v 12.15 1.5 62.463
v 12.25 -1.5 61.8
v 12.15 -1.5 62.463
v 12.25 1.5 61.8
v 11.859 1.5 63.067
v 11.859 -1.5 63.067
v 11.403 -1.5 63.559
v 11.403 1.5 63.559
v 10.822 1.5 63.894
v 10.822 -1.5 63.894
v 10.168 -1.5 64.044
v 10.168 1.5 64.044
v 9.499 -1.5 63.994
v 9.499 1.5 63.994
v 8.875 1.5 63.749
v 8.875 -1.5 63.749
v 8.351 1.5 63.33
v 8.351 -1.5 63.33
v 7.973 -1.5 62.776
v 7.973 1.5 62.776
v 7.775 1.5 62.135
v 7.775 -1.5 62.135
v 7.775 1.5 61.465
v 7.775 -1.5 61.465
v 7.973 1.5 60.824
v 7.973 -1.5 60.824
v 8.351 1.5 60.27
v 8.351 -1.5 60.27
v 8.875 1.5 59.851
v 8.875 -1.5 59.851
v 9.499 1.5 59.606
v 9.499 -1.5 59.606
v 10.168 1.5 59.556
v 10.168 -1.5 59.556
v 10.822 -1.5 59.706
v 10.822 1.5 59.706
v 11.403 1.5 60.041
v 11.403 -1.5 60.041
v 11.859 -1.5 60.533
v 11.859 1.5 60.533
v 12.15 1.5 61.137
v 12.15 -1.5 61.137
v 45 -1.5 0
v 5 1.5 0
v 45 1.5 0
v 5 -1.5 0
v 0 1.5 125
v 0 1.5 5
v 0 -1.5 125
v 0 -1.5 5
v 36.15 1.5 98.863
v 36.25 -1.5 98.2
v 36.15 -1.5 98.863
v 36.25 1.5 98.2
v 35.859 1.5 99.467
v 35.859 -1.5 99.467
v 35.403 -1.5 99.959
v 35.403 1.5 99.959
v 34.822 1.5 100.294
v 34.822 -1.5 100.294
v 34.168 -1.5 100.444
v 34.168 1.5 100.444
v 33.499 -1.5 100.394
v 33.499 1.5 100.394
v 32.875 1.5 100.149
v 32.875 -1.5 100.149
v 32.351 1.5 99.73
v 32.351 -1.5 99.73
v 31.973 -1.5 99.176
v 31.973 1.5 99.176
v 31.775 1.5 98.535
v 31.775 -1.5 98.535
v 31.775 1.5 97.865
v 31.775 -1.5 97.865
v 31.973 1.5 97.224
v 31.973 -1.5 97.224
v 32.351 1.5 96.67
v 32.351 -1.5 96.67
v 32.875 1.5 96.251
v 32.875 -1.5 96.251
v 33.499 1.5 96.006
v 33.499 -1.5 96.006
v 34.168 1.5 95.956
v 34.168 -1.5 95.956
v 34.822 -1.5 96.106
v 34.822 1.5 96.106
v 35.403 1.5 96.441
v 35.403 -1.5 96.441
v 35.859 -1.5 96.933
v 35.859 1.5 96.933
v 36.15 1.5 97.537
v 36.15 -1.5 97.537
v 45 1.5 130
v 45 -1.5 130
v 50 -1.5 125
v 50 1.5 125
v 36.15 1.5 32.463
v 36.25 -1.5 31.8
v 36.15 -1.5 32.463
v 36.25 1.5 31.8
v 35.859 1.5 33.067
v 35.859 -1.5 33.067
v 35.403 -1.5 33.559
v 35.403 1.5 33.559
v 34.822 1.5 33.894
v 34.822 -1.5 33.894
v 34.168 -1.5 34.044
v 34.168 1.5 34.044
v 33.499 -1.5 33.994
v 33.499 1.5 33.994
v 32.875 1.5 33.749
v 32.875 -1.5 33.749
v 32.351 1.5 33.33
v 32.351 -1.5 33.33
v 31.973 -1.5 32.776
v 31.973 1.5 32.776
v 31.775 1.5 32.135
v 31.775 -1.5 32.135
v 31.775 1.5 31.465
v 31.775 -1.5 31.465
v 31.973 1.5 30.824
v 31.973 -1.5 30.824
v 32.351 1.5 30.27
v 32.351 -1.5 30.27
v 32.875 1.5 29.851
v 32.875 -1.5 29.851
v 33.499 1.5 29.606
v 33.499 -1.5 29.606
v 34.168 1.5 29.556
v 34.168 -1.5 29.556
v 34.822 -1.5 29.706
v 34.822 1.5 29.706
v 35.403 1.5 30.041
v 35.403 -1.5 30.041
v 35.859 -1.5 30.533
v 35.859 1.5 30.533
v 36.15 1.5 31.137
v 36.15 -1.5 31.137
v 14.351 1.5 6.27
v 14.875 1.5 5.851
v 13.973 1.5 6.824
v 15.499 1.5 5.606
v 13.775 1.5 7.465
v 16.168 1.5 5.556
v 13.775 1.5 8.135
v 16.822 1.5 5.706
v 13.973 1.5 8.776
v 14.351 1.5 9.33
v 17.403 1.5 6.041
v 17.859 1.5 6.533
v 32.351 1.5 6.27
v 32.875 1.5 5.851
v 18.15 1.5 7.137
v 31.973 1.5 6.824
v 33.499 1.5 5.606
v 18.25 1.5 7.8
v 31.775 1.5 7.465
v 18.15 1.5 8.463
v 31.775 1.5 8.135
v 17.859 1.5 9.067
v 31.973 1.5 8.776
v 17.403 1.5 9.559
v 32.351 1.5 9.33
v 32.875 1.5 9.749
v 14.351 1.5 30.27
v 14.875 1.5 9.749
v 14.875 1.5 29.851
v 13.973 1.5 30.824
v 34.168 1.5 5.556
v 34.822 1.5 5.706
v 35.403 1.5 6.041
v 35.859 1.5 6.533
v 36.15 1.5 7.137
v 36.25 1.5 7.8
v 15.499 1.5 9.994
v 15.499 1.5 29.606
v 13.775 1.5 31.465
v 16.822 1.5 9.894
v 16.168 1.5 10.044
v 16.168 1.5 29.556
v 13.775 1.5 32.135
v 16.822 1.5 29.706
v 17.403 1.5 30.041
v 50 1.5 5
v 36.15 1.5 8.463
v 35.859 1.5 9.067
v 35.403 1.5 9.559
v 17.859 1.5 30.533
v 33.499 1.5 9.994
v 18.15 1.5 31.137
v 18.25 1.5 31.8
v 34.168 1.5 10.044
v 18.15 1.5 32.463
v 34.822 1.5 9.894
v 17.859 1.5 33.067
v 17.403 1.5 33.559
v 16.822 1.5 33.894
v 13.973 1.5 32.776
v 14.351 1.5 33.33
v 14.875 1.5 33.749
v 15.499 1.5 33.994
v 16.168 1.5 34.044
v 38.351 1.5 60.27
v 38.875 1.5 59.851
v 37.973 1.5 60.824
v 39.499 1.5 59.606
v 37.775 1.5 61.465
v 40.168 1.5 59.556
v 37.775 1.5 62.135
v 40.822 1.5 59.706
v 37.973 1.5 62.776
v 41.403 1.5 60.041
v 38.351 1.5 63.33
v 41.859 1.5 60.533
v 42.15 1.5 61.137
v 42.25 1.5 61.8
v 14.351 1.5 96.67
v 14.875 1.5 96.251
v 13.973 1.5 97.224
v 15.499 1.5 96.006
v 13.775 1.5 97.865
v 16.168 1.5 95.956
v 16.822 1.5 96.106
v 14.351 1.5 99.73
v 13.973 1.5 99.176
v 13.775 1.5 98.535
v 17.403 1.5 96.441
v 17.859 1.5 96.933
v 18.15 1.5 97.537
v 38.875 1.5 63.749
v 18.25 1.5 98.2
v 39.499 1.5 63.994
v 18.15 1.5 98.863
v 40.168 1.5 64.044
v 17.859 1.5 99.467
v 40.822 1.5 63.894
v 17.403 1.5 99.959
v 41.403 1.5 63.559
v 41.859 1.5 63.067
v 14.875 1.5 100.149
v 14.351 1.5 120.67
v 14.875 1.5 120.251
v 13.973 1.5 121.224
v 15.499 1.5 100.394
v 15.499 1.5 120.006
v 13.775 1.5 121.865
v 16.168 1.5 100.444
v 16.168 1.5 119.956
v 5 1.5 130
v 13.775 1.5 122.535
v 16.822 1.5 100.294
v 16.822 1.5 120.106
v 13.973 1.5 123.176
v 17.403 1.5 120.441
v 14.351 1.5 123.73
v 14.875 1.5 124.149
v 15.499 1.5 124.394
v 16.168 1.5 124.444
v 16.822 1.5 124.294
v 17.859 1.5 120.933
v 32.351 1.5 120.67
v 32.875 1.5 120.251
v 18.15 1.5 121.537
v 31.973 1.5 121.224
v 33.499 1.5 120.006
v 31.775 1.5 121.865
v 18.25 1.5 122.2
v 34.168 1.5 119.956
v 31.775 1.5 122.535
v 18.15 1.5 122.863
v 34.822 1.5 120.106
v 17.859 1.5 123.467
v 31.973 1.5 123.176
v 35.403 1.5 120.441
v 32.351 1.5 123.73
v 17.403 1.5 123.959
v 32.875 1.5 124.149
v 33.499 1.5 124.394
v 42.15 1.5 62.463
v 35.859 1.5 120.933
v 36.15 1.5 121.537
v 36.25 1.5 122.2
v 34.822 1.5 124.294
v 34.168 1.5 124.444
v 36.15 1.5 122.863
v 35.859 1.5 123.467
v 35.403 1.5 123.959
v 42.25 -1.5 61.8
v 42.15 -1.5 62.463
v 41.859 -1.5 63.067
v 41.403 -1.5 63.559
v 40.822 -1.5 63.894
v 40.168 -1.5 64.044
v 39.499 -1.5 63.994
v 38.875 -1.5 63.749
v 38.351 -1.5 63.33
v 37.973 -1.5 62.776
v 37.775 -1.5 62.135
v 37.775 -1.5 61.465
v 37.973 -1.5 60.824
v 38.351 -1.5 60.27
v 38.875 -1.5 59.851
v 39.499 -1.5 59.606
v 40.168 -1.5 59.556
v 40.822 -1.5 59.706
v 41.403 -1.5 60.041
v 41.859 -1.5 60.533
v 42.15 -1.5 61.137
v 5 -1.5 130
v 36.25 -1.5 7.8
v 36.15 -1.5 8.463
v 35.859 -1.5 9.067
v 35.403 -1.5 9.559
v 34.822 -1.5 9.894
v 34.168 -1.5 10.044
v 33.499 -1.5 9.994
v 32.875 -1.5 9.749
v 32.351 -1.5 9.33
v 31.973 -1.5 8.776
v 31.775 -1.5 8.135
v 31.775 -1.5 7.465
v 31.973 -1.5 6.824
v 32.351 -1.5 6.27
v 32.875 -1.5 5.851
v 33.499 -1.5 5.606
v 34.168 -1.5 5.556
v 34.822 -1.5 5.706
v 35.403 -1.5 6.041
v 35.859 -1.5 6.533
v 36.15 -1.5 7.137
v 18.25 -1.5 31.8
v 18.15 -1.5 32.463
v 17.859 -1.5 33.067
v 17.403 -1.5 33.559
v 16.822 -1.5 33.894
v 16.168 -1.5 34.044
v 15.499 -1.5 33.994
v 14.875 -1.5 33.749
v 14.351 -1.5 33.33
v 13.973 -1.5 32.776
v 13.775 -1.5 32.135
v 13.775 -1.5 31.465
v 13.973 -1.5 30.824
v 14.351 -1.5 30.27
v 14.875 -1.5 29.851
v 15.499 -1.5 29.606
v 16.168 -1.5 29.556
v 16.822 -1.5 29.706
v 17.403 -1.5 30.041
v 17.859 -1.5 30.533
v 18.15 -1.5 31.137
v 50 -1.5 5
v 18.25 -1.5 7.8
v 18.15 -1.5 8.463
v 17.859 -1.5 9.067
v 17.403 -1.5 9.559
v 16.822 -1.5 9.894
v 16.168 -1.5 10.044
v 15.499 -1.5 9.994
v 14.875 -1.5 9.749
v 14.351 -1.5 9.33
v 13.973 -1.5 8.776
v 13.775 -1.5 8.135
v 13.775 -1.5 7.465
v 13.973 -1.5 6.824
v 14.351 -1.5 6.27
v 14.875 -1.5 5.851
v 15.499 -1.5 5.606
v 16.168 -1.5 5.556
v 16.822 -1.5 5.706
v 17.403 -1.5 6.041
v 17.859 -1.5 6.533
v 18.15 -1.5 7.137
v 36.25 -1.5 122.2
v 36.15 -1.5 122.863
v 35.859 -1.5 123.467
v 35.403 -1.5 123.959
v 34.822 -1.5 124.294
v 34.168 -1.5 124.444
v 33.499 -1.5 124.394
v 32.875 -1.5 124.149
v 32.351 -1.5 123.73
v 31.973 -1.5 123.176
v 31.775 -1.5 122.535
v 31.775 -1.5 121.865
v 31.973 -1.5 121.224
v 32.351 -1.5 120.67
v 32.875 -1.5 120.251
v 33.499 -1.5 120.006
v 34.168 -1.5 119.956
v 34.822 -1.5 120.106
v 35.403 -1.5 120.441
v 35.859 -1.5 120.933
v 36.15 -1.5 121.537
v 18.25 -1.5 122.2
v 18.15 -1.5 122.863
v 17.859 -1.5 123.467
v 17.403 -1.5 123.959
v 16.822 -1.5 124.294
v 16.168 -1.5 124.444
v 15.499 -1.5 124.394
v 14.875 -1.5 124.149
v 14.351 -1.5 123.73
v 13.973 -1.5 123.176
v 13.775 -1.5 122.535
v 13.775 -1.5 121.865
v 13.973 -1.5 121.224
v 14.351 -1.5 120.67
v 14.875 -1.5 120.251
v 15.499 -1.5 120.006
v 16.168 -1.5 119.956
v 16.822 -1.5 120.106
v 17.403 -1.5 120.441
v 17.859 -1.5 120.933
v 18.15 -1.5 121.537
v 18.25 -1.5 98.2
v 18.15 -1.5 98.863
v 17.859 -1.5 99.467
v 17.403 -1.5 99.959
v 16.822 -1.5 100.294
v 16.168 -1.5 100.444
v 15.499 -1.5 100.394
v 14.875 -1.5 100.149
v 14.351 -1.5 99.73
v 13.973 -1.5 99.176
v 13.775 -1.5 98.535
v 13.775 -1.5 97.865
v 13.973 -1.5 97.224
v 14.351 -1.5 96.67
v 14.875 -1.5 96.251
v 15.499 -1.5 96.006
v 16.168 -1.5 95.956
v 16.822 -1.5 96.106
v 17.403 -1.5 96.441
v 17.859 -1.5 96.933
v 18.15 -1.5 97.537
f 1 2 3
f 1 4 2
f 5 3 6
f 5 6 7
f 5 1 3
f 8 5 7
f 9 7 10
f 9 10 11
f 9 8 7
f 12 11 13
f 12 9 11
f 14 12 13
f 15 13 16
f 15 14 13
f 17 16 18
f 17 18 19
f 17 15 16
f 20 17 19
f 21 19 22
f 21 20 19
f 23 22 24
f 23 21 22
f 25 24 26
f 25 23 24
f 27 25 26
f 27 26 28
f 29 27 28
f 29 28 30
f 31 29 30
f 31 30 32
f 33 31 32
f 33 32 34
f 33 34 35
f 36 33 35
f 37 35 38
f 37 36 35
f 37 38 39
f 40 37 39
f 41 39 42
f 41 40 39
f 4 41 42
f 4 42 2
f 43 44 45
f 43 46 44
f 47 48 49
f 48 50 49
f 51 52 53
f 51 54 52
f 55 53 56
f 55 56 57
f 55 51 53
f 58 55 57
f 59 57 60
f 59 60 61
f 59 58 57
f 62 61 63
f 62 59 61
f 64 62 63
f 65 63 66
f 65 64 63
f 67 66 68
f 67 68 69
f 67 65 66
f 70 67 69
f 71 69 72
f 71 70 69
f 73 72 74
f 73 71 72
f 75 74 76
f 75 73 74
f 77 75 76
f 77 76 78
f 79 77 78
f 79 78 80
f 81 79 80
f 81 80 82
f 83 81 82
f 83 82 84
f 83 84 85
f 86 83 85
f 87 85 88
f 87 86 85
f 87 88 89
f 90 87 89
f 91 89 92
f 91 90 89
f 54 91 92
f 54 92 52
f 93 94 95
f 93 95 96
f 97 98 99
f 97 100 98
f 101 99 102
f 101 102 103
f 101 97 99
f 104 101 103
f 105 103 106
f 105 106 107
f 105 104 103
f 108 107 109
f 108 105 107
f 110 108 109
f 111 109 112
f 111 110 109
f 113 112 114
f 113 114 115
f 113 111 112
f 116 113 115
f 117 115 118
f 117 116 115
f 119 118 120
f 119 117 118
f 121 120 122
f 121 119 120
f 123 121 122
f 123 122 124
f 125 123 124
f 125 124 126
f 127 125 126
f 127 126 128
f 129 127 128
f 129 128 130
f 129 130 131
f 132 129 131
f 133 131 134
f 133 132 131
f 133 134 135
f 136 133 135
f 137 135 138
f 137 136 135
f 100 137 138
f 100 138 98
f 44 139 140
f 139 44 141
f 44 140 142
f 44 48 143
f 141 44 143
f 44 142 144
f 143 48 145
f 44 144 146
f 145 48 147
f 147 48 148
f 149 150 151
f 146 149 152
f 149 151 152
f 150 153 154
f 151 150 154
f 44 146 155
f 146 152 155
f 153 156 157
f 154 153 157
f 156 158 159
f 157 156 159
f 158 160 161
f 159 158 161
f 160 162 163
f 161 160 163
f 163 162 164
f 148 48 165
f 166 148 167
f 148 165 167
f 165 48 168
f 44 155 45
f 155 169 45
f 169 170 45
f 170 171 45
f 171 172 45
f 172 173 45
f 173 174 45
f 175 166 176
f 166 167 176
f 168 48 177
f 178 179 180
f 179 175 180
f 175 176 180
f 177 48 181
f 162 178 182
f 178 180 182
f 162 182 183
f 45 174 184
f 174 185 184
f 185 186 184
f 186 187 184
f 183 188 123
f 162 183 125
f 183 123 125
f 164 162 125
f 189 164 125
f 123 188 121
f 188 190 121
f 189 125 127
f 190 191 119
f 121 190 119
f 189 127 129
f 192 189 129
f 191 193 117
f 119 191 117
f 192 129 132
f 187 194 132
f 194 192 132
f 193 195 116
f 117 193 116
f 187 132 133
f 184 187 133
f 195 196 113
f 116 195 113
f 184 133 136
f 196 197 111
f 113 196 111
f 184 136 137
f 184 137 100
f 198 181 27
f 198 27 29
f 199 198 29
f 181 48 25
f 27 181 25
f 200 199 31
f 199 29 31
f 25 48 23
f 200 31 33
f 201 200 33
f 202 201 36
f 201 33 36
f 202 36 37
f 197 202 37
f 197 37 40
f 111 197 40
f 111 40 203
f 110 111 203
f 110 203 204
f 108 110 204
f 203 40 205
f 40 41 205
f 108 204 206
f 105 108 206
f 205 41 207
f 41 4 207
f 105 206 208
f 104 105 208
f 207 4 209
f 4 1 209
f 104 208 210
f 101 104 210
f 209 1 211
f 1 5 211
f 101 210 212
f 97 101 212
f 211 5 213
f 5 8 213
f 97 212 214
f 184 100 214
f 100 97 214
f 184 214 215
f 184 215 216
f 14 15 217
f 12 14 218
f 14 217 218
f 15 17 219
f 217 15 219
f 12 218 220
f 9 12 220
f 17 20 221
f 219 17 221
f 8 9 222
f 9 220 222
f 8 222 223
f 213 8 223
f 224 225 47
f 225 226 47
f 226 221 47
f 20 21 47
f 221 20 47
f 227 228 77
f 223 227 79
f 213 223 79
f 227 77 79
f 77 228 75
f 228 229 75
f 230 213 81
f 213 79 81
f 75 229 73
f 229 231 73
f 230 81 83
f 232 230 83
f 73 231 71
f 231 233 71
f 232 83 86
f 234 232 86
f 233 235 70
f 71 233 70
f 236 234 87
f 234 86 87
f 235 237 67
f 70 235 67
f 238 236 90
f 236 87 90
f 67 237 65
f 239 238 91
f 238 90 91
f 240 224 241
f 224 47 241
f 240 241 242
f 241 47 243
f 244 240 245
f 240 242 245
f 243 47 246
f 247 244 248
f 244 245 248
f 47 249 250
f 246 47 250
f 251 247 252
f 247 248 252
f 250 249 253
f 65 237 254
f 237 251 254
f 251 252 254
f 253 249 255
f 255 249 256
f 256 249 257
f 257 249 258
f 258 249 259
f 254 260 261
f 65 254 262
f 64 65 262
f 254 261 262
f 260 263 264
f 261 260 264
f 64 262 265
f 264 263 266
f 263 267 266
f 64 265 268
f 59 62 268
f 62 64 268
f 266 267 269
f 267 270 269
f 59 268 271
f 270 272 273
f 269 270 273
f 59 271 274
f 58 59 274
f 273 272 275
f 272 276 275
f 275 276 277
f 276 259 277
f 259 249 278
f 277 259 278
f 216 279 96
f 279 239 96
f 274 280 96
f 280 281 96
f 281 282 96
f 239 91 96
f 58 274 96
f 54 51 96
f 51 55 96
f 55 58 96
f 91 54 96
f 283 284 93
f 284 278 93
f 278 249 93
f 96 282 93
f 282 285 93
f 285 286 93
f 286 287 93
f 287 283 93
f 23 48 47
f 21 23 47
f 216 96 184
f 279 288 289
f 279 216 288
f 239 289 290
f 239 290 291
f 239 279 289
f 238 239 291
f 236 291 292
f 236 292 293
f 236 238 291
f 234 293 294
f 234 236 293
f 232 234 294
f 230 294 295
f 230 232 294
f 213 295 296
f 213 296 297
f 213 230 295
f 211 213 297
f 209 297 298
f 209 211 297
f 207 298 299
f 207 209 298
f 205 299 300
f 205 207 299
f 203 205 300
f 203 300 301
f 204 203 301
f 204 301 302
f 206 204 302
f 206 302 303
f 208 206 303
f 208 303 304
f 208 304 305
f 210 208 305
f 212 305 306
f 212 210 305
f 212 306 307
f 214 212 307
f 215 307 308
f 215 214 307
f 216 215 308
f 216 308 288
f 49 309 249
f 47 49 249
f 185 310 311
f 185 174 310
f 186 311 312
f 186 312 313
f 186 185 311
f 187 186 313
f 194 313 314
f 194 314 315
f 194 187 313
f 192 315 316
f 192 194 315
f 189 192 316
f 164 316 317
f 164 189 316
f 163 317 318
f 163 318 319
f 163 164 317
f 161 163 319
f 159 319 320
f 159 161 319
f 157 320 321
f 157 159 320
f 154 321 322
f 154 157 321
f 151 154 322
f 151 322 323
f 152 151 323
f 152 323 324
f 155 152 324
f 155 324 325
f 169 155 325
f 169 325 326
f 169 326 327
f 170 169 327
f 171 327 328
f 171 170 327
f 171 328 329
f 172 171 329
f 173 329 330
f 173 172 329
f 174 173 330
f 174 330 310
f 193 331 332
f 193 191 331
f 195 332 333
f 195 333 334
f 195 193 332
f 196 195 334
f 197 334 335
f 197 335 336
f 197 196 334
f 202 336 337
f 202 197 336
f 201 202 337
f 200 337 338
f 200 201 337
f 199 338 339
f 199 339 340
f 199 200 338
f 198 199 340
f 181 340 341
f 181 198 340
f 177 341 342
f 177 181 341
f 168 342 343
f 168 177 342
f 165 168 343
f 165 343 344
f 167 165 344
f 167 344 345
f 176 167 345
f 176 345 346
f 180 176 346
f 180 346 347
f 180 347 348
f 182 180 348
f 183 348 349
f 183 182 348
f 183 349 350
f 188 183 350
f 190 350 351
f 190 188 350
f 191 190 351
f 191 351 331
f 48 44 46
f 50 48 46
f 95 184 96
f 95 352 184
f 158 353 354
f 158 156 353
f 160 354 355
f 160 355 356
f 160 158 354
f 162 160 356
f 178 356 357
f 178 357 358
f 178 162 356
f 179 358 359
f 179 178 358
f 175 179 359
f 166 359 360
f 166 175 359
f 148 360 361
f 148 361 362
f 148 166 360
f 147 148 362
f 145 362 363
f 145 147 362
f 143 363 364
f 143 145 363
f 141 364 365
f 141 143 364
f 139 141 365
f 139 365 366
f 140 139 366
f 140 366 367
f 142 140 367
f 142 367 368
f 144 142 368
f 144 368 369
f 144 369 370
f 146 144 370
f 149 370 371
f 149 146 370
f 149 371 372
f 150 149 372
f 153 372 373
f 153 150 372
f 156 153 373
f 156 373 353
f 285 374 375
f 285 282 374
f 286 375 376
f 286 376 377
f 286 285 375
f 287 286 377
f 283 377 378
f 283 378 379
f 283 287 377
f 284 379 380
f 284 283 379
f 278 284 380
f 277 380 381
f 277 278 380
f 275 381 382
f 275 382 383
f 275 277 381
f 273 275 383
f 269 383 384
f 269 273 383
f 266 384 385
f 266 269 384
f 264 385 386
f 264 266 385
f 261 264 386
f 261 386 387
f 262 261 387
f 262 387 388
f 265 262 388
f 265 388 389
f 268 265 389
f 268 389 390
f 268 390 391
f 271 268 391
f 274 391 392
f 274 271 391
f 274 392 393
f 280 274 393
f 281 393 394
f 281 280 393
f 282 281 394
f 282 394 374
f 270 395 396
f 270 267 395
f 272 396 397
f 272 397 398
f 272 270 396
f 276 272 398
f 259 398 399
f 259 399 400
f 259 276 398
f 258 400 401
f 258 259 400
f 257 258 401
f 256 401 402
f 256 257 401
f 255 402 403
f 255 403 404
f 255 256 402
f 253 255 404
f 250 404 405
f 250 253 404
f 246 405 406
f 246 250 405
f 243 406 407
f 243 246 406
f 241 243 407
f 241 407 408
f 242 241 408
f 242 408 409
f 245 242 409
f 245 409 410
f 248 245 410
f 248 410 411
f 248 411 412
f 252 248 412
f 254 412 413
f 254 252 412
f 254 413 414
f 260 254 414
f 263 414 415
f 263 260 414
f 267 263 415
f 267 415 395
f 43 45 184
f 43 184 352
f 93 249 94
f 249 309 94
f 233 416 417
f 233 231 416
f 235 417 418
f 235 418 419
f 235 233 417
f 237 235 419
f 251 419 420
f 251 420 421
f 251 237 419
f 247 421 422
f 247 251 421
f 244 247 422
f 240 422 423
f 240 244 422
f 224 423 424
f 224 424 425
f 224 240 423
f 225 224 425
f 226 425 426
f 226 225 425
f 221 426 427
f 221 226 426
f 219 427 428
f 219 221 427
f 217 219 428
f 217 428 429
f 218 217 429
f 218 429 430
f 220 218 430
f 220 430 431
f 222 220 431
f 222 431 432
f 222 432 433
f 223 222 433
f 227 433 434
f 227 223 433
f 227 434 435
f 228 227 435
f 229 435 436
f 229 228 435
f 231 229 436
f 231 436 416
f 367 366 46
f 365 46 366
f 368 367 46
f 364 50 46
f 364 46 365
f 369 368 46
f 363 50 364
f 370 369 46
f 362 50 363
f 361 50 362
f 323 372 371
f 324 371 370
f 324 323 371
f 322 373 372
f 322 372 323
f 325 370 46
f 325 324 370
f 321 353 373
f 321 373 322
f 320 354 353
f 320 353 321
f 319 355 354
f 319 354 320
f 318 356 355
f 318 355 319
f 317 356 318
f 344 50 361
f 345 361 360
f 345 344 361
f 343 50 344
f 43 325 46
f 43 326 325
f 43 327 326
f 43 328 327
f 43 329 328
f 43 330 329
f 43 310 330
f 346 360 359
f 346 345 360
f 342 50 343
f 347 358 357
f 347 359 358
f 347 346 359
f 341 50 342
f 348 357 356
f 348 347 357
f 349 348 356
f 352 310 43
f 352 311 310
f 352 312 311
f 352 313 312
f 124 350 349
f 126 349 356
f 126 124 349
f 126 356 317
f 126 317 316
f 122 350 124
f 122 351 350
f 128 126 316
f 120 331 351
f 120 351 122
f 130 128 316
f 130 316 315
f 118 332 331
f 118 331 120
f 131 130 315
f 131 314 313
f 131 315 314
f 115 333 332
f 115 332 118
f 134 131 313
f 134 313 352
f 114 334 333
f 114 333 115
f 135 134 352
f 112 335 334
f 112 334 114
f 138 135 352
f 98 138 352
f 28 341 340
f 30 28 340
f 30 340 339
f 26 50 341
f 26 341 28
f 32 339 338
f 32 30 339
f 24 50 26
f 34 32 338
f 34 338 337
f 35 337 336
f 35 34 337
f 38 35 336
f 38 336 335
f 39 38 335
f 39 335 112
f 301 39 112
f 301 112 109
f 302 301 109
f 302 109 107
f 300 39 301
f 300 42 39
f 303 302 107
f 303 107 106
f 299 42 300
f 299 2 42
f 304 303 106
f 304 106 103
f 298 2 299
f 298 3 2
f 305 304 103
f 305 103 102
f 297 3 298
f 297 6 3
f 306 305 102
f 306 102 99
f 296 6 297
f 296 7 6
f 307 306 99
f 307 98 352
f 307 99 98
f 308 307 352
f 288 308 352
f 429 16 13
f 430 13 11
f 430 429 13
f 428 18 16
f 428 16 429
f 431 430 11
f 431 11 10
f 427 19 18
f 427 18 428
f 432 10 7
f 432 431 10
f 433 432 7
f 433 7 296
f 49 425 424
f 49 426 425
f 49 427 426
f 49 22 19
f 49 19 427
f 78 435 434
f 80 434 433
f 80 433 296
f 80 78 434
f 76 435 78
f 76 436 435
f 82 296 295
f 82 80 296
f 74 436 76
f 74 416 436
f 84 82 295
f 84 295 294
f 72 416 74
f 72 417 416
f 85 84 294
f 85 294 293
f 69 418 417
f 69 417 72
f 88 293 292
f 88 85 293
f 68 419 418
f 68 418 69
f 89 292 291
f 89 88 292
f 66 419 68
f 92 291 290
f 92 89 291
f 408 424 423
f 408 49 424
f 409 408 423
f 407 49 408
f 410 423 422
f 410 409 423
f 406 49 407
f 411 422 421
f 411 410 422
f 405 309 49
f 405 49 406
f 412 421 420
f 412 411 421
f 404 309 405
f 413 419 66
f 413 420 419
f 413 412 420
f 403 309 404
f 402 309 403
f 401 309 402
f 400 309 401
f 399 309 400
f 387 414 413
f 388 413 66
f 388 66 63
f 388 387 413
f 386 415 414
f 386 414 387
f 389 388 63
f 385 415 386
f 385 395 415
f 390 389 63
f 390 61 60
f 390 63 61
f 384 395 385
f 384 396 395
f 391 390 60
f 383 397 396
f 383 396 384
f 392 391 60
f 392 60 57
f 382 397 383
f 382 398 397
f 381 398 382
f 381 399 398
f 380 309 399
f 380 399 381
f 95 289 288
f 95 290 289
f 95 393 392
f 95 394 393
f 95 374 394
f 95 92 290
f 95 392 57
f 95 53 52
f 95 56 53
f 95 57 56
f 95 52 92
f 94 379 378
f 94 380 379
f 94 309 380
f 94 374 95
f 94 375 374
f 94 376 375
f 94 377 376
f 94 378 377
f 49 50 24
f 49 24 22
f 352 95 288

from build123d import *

# Parameters (mm, degrees)
F0_W     = 50
F0_H     = 130
F0_R     = 2.25
F1_DEPTH = 1.5
F2_SIZE  = 5


with BuildPart() as f1:
    # F0 (on Front) → F1 (new body, symmetric)
    with BuildSketch(Plane.XZ):
        with Locations((25, 65)):
            Rectangle(F0_W, F0_H)
        with Locations((16, 7.8)):
            Circle(F0_R, mode=Mode.SUBTRACT)
        with Locations((16, 31.8)):
            Circle(F0_R, mode=Mode.SUBTRACT)
        with Locations((10, 61.8)):
            Circle(F0_R, mode=Mode.SUBTRACT)
        with Locations((34, 7.8)):
            Circle(F0_R, mode=Mode.SUBTRACT)
        with Locations((34, 31.8)):
            Circle(F0_R, mode=Mode.SUBTRACT)
        with Locations((40, 61.8)):
            Circle(F0_R, mode=Mode.SUBTRACT)
        with Locations((16, 98.2)):
            Circle(F0_R, mode=Mode.SUBTRACT)
        with Locations((16, 122.2)):
            Circle(F0_R, mode=Mode.SUBTRACT)
        with Locations((34, 98.2)):
            Circle(F0_R, mode=Mode.SUBTRACT)
        with Locations((34, 122.2)):
            Circle(F0_R, mode=Mode.SUBTRACT)
    extrude(amount=F1_DEPTH, both=True)

    # F2
    f2_edges = [f1.edges().sort_by_distance(p)[0] for p in [
        (0, 0, 0),
        (50, 0, 0),
        (0, 0, 130),
        (50, 0, 130),
    ]]
    chamfer(f2_edges, length=F2_SIZE)


solid = f1.part
